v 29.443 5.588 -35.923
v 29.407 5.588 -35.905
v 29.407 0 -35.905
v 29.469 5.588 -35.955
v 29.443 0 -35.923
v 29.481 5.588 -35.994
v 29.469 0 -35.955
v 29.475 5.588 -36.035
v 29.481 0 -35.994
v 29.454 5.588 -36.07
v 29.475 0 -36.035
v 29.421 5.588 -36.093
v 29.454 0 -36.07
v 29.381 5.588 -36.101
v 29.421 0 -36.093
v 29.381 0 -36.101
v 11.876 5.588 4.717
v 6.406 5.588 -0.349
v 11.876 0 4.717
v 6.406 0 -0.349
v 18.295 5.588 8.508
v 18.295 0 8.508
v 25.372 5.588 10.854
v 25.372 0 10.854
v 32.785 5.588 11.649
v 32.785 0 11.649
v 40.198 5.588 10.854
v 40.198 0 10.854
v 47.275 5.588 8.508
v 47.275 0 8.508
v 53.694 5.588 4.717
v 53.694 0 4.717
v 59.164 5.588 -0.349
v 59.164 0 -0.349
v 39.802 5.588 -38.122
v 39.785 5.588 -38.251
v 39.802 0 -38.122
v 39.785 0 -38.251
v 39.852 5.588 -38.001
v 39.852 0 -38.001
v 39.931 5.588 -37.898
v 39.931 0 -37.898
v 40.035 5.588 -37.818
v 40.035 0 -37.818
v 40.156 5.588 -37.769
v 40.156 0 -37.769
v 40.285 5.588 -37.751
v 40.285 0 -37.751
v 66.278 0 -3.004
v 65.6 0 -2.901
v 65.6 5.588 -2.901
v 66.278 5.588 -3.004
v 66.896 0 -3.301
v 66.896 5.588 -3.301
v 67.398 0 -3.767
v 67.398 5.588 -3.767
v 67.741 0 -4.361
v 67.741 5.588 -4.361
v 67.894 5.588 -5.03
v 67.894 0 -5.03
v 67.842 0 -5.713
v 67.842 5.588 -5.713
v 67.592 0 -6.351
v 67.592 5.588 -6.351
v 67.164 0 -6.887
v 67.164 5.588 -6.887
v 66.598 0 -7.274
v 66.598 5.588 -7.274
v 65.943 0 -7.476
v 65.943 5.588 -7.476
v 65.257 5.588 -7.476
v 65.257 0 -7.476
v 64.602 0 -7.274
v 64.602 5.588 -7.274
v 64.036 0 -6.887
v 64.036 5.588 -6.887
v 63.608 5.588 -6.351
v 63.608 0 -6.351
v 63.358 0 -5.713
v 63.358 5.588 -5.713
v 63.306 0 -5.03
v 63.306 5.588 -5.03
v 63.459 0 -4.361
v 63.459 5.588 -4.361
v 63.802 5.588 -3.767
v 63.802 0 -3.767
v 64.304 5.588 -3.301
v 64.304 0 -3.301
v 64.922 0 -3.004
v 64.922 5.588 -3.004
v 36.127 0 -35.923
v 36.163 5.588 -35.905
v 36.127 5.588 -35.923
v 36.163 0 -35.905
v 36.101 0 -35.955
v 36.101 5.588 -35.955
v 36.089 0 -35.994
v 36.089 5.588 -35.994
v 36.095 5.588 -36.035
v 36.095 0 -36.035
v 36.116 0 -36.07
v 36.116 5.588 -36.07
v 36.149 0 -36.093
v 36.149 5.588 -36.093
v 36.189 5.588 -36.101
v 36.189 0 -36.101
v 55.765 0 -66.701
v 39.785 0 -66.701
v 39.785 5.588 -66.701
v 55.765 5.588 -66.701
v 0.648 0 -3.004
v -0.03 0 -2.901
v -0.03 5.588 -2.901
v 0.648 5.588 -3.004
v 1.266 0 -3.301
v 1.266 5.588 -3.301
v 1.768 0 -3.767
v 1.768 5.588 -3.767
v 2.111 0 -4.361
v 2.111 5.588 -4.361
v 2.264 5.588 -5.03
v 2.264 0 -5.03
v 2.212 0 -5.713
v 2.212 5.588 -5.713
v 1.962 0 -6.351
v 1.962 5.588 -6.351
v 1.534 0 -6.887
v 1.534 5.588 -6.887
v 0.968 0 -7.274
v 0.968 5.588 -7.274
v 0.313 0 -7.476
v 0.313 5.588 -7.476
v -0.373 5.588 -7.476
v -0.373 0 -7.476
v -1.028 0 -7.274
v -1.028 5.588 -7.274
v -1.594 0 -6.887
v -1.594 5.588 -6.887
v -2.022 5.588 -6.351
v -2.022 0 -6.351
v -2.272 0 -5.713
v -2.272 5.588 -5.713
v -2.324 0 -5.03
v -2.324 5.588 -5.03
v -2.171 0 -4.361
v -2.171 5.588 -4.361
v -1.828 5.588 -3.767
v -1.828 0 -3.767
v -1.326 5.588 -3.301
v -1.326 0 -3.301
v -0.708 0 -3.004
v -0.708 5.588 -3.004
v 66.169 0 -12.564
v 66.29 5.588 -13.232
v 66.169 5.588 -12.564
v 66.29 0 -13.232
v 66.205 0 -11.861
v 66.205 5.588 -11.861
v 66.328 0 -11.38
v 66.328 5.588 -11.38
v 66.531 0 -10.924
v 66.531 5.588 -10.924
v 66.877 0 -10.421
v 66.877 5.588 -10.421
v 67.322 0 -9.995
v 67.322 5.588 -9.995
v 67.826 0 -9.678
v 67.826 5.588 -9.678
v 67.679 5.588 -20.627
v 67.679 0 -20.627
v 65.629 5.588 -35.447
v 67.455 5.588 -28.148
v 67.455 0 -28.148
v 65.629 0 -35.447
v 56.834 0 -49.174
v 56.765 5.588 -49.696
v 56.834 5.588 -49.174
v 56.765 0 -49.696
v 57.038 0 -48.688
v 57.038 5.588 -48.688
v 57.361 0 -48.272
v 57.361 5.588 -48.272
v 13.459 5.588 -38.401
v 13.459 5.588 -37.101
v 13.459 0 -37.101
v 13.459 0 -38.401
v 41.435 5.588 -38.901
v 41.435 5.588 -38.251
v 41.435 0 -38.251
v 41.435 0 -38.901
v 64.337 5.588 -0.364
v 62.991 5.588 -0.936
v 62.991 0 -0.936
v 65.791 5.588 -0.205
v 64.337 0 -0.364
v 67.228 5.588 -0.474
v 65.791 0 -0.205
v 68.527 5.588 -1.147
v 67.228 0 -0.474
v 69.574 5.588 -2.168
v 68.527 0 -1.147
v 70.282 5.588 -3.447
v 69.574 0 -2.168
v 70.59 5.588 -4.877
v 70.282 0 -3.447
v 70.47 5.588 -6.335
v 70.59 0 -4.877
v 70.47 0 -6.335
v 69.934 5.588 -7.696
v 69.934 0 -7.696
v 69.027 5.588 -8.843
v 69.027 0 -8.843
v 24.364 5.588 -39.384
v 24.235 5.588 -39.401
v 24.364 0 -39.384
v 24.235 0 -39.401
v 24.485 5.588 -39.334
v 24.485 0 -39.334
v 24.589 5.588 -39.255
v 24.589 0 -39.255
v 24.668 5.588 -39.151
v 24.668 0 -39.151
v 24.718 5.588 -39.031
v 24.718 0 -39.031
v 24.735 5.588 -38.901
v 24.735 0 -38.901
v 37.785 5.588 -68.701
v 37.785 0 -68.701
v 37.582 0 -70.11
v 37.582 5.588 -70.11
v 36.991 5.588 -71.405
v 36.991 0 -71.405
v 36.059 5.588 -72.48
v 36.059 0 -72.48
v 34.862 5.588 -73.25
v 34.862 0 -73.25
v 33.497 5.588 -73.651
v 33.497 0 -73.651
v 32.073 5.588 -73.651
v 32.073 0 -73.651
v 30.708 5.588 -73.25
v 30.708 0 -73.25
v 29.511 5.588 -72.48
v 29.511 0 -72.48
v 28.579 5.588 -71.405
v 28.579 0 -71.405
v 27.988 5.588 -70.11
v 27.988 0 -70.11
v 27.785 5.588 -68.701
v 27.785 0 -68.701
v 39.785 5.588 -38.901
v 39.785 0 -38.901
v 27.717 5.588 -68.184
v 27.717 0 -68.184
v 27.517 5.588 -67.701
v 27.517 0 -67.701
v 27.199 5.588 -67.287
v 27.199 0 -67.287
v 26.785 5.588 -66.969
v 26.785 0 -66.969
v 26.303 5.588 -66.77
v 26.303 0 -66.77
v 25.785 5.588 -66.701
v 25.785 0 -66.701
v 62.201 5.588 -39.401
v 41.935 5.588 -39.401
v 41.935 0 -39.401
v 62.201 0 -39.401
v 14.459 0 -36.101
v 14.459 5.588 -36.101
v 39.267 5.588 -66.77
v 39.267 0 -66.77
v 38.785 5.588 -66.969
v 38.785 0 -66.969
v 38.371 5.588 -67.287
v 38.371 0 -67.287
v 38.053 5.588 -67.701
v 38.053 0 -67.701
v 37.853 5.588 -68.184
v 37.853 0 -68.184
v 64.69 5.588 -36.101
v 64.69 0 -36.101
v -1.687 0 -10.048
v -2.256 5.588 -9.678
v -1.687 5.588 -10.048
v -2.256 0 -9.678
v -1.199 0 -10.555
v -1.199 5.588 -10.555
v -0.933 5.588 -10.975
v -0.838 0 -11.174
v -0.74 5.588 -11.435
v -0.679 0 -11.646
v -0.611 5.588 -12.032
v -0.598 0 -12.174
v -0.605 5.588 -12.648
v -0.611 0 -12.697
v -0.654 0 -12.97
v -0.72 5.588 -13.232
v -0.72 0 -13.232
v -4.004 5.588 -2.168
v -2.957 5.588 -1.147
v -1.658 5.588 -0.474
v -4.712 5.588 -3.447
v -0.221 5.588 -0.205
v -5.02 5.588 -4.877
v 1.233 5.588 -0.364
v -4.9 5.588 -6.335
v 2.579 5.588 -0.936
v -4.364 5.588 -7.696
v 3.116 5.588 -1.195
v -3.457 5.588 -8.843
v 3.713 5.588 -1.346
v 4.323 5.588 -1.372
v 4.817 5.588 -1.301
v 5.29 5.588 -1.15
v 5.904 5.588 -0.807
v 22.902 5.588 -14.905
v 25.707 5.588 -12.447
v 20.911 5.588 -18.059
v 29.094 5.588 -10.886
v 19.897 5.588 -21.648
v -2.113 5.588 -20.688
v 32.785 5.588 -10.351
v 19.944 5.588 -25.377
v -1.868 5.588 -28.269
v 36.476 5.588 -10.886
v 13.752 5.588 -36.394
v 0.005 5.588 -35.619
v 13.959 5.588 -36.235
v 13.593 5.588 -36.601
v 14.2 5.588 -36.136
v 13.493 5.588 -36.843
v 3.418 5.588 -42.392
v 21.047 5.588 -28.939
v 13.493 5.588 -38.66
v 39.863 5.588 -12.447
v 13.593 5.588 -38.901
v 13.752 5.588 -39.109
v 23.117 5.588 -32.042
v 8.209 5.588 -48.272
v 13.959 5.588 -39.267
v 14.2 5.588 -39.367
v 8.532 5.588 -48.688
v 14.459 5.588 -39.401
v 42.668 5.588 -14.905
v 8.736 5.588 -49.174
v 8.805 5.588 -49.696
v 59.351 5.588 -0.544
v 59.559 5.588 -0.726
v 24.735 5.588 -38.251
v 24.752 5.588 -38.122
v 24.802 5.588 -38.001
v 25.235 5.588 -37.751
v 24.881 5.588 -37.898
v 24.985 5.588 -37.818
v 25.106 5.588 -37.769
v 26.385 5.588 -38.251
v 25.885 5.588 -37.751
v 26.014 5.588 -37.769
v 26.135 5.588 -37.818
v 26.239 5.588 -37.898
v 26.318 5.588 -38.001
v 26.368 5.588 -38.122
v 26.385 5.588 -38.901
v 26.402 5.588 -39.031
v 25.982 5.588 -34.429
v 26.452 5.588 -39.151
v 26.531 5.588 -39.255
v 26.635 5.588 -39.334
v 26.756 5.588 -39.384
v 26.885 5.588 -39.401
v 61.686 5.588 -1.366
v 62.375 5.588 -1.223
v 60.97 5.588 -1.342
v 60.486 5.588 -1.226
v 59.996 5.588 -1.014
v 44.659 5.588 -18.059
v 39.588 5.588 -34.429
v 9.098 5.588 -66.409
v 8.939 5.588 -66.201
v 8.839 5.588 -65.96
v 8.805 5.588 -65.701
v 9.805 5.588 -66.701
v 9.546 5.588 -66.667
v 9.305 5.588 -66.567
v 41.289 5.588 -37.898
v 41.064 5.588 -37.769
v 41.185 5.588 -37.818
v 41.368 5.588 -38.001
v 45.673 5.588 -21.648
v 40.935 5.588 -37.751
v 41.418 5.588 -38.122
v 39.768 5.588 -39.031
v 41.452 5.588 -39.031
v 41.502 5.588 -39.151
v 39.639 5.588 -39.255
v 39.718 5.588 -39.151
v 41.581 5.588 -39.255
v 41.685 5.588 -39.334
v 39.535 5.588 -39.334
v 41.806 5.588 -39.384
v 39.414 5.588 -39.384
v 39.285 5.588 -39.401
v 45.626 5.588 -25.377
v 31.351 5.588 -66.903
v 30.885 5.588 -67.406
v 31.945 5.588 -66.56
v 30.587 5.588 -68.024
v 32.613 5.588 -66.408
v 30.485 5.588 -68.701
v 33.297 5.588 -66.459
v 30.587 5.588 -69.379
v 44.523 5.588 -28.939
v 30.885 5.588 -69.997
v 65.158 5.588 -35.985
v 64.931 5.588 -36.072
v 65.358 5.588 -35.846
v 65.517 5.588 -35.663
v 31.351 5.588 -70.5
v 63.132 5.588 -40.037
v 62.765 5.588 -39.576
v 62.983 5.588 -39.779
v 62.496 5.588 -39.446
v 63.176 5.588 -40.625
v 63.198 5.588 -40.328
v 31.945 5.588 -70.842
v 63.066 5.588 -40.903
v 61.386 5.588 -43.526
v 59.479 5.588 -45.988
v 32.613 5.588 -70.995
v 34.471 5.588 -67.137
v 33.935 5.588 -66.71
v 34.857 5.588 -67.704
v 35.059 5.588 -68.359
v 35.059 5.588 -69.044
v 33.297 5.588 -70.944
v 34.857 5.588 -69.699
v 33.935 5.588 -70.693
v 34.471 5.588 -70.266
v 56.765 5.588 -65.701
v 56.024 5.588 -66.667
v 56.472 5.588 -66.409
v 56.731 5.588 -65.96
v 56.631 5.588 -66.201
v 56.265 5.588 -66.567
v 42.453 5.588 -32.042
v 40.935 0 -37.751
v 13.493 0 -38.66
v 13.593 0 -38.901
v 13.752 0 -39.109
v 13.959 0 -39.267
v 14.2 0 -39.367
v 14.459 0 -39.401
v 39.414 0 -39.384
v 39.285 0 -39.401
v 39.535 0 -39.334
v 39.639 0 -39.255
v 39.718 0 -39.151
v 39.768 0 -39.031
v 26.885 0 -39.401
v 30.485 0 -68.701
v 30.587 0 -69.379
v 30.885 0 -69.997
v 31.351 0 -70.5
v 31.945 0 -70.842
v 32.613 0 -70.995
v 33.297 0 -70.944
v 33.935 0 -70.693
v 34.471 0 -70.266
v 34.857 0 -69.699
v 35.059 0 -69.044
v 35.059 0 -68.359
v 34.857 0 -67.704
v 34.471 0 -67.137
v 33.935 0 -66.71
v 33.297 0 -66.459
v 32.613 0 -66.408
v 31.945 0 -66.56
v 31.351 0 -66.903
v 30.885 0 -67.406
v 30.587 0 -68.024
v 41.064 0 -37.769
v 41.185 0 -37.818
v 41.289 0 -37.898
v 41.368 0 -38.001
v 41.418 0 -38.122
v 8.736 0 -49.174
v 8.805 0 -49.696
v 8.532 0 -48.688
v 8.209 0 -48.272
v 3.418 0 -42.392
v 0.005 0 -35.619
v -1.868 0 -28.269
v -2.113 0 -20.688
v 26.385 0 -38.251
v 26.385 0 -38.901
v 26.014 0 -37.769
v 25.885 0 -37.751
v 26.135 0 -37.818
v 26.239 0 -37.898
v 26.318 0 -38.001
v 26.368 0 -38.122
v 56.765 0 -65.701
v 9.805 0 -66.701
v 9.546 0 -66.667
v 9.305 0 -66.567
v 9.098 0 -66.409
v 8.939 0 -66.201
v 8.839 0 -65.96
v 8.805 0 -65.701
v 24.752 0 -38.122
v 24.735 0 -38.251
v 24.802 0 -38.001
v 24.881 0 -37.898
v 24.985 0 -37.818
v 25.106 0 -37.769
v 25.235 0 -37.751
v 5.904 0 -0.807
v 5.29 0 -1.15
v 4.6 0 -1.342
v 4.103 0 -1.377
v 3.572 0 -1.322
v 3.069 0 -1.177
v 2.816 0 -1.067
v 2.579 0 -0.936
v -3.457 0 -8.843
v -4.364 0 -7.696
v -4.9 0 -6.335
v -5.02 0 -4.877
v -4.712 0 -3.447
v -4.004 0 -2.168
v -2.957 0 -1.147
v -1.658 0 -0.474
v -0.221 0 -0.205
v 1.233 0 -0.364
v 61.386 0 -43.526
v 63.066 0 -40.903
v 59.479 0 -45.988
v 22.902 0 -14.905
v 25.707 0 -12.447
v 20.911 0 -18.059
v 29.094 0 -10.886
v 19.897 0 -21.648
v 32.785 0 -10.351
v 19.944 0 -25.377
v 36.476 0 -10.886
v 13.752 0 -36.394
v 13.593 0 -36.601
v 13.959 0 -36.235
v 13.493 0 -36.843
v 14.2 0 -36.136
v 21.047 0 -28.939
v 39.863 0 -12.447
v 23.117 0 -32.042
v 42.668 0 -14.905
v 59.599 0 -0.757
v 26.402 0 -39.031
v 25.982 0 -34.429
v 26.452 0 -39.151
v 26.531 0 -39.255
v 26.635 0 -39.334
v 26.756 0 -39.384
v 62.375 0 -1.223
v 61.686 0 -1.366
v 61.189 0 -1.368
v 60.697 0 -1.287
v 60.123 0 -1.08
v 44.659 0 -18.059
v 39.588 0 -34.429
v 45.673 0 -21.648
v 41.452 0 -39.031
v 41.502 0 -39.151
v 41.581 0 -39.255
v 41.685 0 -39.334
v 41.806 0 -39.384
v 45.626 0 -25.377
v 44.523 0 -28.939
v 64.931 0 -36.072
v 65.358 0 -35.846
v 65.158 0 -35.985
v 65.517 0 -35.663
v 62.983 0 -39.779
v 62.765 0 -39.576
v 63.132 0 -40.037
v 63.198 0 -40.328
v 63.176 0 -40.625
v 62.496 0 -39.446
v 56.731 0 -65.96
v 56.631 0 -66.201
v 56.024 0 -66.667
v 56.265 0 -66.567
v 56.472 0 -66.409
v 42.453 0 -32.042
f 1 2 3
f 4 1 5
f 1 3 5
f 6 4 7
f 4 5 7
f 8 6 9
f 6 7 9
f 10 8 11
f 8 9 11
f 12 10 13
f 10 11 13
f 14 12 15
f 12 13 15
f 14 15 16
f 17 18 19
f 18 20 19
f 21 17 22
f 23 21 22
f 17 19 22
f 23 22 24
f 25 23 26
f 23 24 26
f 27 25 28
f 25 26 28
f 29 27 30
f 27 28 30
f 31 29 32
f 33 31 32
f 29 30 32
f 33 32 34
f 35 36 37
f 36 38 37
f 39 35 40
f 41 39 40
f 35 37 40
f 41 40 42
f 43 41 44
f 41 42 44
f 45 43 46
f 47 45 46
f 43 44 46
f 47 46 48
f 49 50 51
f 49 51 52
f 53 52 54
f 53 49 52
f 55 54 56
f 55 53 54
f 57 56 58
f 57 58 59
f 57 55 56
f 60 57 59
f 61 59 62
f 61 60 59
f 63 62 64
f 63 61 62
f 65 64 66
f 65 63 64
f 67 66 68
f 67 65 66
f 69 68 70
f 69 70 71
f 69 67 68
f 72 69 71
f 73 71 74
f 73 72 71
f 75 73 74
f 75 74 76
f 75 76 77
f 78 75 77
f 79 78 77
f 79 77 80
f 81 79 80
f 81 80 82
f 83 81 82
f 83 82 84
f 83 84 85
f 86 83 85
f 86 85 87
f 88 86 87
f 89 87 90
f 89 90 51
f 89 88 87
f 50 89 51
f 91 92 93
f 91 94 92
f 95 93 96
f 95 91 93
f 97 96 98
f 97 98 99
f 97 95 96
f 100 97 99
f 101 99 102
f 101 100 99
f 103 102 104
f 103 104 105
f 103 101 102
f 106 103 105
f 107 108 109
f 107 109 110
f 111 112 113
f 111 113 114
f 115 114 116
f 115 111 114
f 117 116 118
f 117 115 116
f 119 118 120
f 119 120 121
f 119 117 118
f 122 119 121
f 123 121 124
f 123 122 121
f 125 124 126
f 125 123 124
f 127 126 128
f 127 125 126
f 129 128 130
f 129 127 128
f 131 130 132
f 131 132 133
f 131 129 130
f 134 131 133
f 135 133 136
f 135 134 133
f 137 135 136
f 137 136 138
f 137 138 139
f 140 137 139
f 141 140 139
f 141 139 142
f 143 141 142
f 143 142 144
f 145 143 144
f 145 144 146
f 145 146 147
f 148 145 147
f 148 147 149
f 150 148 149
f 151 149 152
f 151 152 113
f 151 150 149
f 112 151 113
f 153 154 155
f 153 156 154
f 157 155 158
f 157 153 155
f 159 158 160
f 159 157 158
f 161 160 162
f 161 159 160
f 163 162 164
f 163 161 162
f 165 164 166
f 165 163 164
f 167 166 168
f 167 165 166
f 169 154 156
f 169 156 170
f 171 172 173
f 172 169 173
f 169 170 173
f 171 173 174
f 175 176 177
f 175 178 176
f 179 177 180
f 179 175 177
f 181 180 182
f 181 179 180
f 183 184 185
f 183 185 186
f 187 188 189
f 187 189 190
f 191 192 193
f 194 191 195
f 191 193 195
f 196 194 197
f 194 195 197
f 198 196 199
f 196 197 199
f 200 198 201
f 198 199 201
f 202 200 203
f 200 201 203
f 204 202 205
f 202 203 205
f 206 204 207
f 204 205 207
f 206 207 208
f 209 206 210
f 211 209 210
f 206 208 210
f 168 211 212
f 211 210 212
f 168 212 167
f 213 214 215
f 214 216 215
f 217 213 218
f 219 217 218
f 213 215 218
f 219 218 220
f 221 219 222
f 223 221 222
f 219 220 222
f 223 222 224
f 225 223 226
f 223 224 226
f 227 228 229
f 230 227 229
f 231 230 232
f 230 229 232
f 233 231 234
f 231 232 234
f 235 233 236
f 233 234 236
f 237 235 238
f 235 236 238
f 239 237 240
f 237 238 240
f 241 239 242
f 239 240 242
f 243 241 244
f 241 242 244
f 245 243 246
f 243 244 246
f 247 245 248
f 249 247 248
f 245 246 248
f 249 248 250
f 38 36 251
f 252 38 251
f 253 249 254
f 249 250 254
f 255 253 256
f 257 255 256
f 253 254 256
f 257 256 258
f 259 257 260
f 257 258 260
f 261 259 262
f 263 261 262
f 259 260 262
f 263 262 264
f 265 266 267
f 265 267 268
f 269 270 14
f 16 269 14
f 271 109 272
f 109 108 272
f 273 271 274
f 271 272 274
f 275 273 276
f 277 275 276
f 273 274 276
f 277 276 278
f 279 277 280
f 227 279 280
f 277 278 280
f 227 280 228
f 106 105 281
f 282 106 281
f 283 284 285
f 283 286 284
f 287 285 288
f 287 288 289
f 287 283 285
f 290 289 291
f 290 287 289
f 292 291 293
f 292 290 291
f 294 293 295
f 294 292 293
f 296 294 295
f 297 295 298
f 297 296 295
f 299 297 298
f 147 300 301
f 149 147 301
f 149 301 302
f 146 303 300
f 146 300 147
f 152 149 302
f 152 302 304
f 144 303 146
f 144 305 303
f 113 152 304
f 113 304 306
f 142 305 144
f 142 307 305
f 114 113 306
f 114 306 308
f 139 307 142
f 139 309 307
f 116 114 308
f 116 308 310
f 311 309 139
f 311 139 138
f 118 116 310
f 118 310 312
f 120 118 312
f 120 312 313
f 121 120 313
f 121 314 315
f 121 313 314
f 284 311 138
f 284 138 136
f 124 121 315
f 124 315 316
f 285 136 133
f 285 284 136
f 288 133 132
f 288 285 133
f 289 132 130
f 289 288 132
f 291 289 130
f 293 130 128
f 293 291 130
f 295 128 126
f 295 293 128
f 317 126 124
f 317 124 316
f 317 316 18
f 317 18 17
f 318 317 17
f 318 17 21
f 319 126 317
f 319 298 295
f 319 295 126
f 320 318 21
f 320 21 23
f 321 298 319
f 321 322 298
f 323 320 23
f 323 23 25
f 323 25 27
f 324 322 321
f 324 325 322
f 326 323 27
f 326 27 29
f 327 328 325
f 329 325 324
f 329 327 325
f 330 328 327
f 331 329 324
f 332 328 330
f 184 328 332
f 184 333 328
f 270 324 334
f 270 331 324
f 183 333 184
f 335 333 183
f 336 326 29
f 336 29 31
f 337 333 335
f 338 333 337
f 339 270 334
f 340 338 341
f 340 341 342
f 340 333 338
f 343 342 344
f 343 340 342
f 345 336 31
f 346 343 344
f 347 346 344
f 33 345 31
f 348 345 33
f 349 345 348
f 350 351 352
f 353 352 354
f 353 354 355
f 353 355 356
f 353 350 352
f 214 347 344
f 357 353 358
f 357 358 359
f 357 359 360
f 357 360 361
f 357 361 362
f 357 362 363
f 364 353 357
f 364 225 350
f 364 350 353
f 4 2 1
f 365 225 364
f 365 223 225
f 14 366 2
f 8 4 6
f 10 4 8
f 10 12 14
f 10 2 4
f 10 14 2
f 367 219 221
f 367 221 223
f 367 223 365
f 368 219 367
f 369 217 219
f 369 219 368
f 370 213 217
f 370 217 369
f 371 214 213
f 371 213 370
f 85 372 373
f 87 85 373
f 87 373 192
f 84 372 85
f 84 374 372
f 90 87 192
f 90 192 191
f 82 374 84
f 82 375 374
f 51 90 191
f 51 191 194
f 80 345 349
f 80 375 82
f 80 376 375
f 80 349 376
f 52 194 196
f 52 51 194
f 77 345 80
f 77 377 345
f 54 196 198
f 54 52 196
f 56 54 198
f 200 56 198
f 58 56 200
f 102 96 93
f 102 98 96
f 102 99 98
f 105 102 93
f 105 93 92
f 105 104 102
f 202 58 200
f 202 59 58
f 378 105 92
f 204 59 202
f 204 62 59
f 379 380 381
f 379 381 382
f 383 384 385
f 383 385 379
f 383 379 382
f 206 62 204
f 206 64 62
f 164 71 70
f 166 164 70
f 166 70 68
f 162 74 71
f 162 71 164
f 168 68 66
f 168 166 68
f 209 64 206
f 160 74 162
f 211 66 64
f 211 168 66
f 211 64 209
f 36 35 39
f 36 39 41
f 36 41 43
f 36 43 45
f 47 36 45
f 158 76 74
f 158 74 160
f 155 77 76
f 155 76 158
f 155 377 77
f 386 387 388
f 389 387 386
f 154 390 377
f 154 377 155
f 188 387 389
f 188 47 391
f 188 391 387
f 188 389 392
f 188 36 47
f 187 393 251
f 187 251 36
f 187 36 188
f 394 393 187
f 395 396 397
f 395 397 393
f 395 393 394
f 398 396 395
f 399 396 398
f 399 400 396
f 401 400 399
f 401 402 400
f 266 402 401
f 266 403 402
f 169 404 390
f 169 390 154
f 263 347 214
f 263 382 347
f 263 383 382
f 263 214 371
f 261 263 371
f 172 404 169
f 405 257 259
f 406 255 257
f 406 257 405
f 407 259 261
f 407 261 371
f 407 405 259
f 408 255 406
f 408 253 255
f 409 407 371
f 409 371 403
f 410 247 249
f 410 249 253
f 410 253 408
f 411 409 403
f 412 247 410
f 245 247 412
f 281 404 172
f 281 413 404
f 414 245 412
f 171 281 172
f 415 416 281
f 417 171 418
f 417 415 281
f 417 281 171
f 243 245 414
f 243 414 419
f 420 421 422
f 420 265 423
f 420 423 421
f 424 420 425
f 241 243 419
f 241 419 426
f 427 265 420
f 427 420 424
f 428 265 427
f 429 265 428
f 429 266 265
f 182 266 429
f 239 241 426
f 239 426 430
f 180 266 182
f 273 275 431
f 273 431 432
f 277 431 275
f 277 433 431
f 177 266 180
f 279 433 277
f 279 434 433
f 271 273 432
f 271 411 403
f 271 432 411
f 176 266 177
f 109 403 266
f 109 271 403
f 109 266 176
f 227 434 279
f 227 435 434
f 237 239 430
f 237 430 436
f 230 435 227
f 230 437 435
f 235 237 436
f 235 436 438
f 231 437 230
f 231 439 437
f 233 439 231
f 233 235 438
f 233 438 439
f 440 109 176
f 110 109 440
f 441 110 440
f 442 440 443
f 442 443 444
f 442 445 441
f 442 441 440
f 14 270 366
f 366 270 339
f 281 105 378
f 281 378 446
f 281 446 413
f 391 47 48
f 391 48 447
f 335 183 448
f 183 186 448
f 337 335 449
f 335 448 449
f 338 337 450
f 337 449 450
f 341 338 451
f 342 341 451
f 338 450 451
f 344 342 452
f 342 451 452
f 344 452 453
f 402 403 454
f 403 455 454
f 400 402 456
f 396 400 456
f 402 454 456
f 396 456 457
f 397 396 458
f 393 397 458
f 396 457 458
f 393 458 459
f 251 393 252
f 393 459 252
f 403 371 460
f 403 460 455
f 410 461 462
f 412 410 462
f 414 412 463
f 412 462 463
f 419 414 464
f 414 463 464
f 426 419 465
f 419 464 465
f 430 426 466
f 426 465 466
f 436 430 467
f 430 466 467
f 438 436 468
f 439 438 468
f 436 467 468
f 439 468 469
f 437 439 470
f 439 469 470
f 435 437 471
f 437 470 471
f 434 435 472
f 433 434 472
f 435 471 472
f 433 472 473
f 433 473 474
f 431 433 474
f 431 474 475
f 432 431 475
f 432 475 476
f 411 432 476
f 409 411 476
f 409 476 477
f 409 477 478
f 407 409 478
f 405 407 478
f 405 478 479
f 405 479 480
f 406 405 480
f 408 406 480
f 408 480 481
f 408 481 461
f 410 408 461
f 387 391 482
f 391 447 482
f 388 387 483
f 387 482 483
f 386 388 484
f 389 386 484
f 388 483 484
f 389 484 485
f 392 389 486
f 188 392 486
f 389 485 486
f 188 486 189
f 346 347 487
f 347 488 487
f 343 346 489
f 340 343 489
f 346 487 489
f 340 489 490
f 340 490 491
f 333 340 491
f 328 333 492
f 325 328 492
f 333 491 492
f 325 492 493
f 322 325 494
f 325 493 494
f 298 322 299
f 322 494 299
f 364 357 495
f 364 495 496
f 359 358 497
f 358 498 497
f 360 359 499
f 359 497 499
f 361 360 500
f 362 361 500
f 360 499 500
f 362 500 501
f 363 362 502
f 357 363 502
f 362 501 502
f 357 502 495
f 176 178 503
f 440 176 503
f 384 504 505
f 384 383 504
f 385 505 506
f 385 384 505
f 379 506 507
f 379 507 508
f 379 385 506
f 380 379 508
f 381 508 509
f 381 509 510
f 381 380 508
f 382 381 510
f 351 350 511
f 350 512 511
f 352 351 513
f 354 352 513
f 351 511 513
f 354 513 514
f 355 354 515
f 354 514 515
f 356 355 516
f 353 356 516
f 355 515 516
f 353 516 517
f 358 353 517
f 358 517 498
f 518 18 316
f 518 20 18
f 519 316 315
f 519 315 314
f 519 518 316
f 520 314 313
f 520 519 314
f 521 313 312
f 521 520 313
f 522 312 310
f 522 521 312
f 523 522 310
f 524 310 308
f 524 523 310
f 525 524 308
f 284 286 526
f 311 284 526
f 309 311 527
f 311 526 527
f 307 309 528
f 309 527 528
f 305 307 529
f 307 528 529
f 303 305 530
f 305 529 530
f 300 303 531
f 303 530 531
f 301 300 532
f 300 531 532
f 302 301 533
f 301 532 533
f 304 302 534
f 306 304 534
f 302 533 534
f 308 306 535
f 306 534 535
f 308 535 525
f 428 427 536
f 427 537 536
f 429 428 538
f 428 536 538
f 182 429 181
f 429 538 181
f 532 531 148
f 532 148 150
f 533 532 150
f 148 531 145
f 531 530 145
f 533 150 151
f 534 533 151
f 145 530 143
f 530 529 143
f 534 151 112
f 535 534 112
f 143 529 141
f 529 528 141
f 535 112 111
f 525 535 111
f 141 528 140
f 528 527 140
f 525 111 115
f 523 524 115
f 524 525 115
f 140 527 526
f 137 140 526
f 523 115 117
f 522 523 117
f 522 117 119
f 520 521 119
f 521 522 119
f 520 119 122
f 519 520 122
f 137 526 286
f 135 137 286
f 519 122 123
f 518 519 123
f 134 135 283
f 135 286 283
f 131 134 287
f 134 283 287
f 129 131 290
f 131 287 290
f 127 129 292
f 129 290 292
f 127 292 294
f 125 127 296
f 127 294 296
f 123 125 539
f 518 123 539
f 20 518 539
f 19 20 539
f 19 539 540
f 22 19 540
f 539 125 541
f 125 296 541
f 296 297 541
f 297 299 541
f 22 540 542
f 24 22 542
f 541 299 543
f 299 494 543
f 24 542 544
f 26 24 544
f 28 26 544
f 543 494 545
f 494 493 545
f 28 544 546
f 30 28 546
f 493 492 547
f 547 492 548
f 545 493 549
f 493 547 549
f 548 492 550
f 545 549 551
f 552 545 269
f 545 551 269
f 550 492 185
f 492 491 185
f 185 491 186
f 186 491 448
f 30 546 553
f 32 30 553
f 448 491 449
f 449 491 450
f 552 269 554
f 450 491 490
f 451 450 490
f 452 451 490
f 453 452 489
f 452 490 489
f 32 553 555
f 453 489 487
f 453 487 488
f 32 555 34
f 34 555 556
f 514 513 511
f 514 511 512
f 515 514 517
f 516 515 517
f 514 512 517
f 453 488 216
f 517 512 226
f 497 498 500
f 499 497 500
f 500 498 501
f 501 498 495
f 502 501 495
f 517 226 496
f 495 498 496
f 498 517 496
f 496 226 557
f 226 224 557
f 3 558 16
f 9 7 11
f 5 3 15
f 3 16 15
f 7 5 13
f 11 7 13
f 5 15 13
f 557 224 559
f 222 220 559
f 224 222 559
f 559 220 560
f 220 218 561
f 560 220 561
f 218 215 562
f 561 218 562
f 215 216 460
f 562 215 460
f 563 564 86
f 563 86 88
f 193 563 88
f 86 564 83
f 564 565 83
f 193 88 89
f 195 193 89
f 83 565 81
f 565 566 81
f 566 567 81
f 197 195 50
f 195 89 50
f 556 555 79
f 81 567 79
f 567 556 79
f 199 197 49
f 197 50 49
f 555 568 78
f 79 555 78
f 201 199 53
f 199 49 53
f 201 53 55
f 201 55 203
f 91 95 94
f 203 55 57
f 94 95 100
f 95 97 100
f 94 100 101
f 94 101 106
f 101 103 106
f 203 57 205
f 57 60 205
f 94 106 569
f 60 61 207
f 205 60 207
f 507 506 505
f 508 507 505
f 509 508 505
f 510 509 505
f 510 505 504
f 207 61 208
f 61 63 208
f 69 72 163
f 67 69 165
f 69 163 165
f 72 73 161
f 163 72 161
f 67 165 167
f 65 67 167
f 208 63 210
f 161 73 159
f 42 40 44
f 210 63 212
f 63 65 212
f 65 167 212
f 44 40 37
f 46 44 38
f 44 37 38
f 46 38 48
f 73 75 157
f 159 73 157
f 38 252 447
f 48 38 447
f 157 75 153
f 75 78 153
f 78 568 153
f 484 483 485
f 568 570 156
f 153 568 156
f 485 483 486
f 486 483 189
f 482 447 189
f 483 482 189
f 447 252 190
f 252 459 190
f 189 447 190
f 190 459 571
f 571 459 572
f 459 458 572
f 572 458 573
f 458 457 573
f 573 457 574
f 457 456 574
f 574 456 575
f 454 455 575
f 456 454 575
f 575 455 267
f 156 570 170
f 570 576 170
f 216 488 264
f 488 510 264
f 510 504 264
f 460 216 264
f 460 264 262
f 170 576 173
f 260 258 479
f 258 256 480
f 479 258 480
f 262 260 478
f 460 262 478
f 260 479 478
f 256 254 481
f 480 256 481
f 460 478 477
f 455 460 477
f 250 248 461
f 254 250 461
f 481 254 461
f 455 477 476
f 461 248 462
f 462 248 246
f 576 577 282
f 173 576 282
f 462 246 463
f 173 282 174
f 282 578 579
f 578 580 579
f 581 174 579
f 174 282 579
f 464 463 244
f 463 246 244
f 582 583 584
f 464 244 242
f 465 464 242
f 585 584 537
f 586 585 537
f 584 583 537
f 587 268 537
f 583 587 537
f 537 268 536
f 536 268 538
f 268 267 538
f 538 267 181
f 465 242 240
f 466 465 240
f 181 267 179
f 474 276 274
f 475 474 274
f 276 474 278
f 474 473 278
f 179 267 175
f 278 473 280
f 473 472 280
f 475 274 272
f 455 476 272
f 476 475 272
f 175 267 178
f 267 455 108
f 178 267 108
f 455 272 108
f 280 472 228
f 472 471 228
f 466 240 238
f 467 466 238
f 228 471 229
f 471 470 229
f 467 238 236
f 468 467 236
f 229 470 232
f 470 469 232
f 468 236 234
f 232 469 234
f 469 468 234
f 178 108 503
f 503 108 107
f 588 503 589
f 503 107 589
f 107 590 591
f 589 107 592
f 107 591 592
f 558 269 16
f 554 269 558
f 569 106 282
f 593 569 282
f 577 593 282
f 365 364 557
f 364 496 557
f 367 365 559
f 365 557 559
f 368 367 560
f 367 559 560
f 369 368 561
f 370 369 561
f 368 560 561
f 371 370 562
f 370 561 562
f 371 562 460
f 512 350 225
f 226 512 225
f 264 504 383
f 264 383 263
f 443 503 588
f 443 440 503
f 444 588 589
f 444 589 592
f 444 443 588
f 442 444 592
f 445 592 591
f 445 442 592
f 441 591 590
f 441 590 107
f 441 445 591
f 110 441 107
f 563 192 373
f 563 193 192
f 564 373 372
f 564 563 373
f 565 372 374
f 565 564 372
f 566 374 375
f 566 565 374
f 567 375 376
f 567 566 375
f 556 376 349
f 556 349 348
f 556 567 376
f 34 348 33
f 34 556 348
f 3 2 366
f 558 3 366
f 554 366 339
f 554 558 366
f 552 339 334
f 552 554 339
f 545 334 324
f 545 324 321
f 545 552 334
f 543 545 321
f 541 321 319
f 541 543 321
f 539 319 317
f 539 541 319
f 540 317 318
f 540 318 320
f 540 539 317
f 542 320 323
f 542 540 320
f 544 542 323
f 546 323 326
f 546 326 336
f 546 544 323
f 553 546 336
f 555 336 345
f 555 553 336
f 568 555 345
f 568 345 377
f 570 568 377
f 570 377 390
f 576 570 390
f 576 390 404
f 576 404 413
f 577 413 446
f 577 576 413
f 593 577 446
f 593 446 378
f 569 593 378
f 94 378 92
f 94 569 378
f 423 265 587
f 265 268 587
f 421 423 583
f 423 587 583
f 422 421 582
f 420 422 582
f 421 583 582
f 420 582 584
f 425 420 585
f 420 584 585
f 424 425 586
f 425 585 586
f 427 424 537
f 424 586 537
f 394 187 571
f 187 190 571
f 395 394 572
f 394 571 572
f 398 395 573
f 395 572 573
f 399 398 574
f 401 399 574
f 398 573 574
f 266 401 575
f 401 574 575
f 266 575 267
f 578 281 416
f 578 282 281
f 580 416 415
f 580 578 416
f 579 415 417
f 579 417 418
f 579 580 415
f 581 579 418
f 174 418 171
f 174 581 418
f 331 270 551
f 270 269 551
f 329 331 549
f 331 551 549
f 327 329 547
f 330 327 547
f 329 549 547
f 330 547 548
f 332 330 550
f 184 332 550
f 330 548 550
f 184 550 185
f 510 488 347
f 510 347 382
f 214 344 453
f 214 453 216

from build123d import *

# Parameters (mm, degrees)
SKETCH1_R                  = 35
SKETCH1_R_2                = 13
SKETCH1_R_3                = 5
SKETCH1_R_4                = 2.3
SKETCH1_W                  = 47.96
SKETCH1_H                  = 25
BOSS_EXTRUDE3_DEPTH        = 5.588
F_4_6_4_6_DIAMETER_HOLE1_D = 4.6
FILLET1_R                  = 3
FILLET2_R                  = 2
FILLET3_R                  = 2
FILLET4_R                  = 1
SKETCH6_W                  = 55.082421743
SKETCH6_H                  = 3.3
CUT_EXTRUDE5_DEPTH         = 10
SKETCH7_W                  = 1.65
SKETCH7_H                  = 1.65
BOSS_EXTRUDE4_DEPTH        = 5.588
FILLET5_R                  = 1
FILLET6_R                  = 0.5
FILLET7_R                  = 0.5
FILLET11_R                 = 1
FILLET13_R                 = 0.1
FILLET14_R                 = 0.1


with BuildPart() as part:
    # Sketch1 → Boss-Extrude3 (new body)
    # profile 1 of 5: a face of its own
    with BuildSketch(Plane(origin=(0, 0, 0), x_dir=(1, 0, 0), z_dir=(0, 1, 0))):
        with Locations((32.785, 23.351471482)):
            Circle(SKETCH1_R)
        with Locations(Location((32.785, 23.351471482, 0), (0, 0, 270))):
            Circle(SKETCH1_R_2, mode=Mode.SUBTRACT)
    # profile 2 of 5: a face of its own
    with BuildSketch(Plane(origin=(0, 0, 0), x_dir=(1, 0, 0), z_dir=(0, 1, 0))):
        with Locations((65.600049901, 5.201471482)):
            Circle(SKETCH1_R_3)
        with Locations(Location((65.600049901, 5.201471482, 0), (0, 0, 270))):
            Circle(SKETCH1_R_4, mode=Mode.SUBTRACT)
    # profile 3 of 5: a face of its own
    with BuildSketch(Plane(origin=(0, 0, 0), x_dir=(1, 0, 0), z_dir=(0, 1, 0))):
        with Locations((-0.030049901, 5.201471482)):
            Circle(SKETCH1_R_3)
        with Locations(Location((-0.030049901, 5.201471482, 0), (0, 0, 270))):
            Circle(SKETCH1_R_4, mode=Mode.SUBTRACT)
    # profile 4 of 5: a face of its own
    with BuildSketch(Plane(origin=(0, 0, 0), x_dir=(1, 0, 0), z_dir=(0, 1, 0))):
        with Locations((32.785, 68.701471482)):
            Circle(SKETCH1_R_3)
    # profile 5 of 5: a face of its own
    with BuildSketch(Plane(origin=(0, 0, 0), x_dir=(1, 0, 0), z_dir=(0, 1, 0))):
        with Locations((32.785, 54.201471482)):
            Rectangle(SKETCH1_W, SKETCH1_H)
    extrude(amount=BOSS_EXTRUDE3_DEPTH)

    # Ø4.6 (4.6) Diameter Hole1 (through all)
    with Locations(Plane(origin=(0, 5.588, 0), x_dir=(1, 0, 0), z_dir=(0, 1, 0))):
        with Locations((32.785, 68.701471482)):
            Hole(F_4_6_4_6_DIAMETER_HOLE1_D / 2)

    # Fillet1
    fillet1_edges = [part.edges().sort_by_distance(p)[0] for p in [
        (65.214711372, 2.794, -10.18660079),
        (61.172514444, 2.794, -2.878342174),
        (0.355288628, 2.794, -10.18660079),
        (4.397485556, 2.794, -2.878342174),
    ]]
    fillet(fillet1_edges, radius=FILLET1_R)

    # Fillet2
    fillet2_edges = [part.edges().sort_by_distance(p)[0] for p in [
        (28.202424305, 2.794, -66.701471482),
        (37.367575695, 2.794, -66.701471482),
    ]]
    fillet(fillet2_edges, radius=FILLET2_R)

    # Fillet3
    fillet3_edges = [part.edges().sort_by_distance(p)[0] for p in [
        (8.805, 2.794, -48.845776728),
        (56.765, 2.794, -48.845776728),
    ]]
    fillet(fillet3_edges, radius=FILLET3_R)

    # Fillet4
    fillet4_edges = [part.edges().sort_by_distance(p)[0] for p in [
        (56.765, 2.794, -66.701471482),
        (8.805, 2.794, -66.701471482),
    ]]
    fillet(fillet4_edges, radius=FILLET4_R)

    # Sketch6 → Cut-Extrude5 (cut)
    with BuildSketch(Plane(origin=(0, 5.588, 0), x_dir=(1, 0, 0), z_dir=(0, 1, 0))):
        with Locations((41.000226715, 37.751471482)):
            Rectangle(SKETCH6_W, SKETCH6_H)
    extrude(amount=-CUT_EXTRUDE5_DEPTH, mode=Mode.SUBTRACT)

    # Sketch7 → Boss-Extrude4 (add)
    with BuildSketch(Plane(origin=(0, 5.588, 0), x_dir=(1, 0, 0), z_dir=(0, 1, 0))):
        with Locations((40.61, 38.576471482)):
            Rectangle(SKETCH7_W, SKETCH7_H)
        with Locations((25.56, 38.576471482)):
            Rectangle(SKETCH7_W, SKETCH7_H)
    extrude(amount=-BOSS_EXTRUDE4_DEPTH)

    # Fillet5
    fillet5_edges = [part.edges().sort_by_distance(p)[0] for p in [
        (13.459015843, 2.794, -36.101471482),
        (13.459015843, 2.794, -39.401471482),
    ]]
    fillet(fillet5_edges, radius=FILLET5_R)

    # Fillet6
    fillet6_edges = [part.edges().sort_by_distance(p)[0] for p in [
        (26.385, 2.794, -39.401471482),
        (24.735, 2.794, -39.401471482),
        (41.435, 2.794, -39.401471482),
        (39.785, 2.794, -39.401471482),
    ]]
    fillet(fillet6_edges, radius=FILLET6_R)

    # Fillet7
    fillet7_edges = [part.edges().sort_by_distance(p)[0] for p in [
        (26.385, 2.794, -37.751471482),
        (24.735, 2.794, -37.751471482),
        (41.435, 2.794, -37.751471482),
        (39.785, 2.794, -37.751471482),
    ]]
    fillet(fillet7_edges, radius=FILLET7_R)

    # Fillet11
    fillet11_edges = [part.edges().sort_by_distance(p)[0] for p in [
        (63.888014323, 2.794, -39.401471482),
        (65.380053306, 2.794, -36.101471482),
    ]]
    fillet(fillet11_edges, radius=FILLET11_R)

    # Fillet13
    fillet13_edges = [part.edges().sort_by_distance(p)[0] for p in [
        (30.247777109, 2.794, -36.101471482),
    ]]
    fillet(fillet13_edges, radius=FILLET13_R)

    # Fillet14
    fillet14_edges = [part.edges().sort_by_distance(p)[0] for p in [
        (35.322222891, 2.794, -36.101471482),
    ]]
    fillet(fillet14_edges, radius=FILLET14_R)


solid = part.part
